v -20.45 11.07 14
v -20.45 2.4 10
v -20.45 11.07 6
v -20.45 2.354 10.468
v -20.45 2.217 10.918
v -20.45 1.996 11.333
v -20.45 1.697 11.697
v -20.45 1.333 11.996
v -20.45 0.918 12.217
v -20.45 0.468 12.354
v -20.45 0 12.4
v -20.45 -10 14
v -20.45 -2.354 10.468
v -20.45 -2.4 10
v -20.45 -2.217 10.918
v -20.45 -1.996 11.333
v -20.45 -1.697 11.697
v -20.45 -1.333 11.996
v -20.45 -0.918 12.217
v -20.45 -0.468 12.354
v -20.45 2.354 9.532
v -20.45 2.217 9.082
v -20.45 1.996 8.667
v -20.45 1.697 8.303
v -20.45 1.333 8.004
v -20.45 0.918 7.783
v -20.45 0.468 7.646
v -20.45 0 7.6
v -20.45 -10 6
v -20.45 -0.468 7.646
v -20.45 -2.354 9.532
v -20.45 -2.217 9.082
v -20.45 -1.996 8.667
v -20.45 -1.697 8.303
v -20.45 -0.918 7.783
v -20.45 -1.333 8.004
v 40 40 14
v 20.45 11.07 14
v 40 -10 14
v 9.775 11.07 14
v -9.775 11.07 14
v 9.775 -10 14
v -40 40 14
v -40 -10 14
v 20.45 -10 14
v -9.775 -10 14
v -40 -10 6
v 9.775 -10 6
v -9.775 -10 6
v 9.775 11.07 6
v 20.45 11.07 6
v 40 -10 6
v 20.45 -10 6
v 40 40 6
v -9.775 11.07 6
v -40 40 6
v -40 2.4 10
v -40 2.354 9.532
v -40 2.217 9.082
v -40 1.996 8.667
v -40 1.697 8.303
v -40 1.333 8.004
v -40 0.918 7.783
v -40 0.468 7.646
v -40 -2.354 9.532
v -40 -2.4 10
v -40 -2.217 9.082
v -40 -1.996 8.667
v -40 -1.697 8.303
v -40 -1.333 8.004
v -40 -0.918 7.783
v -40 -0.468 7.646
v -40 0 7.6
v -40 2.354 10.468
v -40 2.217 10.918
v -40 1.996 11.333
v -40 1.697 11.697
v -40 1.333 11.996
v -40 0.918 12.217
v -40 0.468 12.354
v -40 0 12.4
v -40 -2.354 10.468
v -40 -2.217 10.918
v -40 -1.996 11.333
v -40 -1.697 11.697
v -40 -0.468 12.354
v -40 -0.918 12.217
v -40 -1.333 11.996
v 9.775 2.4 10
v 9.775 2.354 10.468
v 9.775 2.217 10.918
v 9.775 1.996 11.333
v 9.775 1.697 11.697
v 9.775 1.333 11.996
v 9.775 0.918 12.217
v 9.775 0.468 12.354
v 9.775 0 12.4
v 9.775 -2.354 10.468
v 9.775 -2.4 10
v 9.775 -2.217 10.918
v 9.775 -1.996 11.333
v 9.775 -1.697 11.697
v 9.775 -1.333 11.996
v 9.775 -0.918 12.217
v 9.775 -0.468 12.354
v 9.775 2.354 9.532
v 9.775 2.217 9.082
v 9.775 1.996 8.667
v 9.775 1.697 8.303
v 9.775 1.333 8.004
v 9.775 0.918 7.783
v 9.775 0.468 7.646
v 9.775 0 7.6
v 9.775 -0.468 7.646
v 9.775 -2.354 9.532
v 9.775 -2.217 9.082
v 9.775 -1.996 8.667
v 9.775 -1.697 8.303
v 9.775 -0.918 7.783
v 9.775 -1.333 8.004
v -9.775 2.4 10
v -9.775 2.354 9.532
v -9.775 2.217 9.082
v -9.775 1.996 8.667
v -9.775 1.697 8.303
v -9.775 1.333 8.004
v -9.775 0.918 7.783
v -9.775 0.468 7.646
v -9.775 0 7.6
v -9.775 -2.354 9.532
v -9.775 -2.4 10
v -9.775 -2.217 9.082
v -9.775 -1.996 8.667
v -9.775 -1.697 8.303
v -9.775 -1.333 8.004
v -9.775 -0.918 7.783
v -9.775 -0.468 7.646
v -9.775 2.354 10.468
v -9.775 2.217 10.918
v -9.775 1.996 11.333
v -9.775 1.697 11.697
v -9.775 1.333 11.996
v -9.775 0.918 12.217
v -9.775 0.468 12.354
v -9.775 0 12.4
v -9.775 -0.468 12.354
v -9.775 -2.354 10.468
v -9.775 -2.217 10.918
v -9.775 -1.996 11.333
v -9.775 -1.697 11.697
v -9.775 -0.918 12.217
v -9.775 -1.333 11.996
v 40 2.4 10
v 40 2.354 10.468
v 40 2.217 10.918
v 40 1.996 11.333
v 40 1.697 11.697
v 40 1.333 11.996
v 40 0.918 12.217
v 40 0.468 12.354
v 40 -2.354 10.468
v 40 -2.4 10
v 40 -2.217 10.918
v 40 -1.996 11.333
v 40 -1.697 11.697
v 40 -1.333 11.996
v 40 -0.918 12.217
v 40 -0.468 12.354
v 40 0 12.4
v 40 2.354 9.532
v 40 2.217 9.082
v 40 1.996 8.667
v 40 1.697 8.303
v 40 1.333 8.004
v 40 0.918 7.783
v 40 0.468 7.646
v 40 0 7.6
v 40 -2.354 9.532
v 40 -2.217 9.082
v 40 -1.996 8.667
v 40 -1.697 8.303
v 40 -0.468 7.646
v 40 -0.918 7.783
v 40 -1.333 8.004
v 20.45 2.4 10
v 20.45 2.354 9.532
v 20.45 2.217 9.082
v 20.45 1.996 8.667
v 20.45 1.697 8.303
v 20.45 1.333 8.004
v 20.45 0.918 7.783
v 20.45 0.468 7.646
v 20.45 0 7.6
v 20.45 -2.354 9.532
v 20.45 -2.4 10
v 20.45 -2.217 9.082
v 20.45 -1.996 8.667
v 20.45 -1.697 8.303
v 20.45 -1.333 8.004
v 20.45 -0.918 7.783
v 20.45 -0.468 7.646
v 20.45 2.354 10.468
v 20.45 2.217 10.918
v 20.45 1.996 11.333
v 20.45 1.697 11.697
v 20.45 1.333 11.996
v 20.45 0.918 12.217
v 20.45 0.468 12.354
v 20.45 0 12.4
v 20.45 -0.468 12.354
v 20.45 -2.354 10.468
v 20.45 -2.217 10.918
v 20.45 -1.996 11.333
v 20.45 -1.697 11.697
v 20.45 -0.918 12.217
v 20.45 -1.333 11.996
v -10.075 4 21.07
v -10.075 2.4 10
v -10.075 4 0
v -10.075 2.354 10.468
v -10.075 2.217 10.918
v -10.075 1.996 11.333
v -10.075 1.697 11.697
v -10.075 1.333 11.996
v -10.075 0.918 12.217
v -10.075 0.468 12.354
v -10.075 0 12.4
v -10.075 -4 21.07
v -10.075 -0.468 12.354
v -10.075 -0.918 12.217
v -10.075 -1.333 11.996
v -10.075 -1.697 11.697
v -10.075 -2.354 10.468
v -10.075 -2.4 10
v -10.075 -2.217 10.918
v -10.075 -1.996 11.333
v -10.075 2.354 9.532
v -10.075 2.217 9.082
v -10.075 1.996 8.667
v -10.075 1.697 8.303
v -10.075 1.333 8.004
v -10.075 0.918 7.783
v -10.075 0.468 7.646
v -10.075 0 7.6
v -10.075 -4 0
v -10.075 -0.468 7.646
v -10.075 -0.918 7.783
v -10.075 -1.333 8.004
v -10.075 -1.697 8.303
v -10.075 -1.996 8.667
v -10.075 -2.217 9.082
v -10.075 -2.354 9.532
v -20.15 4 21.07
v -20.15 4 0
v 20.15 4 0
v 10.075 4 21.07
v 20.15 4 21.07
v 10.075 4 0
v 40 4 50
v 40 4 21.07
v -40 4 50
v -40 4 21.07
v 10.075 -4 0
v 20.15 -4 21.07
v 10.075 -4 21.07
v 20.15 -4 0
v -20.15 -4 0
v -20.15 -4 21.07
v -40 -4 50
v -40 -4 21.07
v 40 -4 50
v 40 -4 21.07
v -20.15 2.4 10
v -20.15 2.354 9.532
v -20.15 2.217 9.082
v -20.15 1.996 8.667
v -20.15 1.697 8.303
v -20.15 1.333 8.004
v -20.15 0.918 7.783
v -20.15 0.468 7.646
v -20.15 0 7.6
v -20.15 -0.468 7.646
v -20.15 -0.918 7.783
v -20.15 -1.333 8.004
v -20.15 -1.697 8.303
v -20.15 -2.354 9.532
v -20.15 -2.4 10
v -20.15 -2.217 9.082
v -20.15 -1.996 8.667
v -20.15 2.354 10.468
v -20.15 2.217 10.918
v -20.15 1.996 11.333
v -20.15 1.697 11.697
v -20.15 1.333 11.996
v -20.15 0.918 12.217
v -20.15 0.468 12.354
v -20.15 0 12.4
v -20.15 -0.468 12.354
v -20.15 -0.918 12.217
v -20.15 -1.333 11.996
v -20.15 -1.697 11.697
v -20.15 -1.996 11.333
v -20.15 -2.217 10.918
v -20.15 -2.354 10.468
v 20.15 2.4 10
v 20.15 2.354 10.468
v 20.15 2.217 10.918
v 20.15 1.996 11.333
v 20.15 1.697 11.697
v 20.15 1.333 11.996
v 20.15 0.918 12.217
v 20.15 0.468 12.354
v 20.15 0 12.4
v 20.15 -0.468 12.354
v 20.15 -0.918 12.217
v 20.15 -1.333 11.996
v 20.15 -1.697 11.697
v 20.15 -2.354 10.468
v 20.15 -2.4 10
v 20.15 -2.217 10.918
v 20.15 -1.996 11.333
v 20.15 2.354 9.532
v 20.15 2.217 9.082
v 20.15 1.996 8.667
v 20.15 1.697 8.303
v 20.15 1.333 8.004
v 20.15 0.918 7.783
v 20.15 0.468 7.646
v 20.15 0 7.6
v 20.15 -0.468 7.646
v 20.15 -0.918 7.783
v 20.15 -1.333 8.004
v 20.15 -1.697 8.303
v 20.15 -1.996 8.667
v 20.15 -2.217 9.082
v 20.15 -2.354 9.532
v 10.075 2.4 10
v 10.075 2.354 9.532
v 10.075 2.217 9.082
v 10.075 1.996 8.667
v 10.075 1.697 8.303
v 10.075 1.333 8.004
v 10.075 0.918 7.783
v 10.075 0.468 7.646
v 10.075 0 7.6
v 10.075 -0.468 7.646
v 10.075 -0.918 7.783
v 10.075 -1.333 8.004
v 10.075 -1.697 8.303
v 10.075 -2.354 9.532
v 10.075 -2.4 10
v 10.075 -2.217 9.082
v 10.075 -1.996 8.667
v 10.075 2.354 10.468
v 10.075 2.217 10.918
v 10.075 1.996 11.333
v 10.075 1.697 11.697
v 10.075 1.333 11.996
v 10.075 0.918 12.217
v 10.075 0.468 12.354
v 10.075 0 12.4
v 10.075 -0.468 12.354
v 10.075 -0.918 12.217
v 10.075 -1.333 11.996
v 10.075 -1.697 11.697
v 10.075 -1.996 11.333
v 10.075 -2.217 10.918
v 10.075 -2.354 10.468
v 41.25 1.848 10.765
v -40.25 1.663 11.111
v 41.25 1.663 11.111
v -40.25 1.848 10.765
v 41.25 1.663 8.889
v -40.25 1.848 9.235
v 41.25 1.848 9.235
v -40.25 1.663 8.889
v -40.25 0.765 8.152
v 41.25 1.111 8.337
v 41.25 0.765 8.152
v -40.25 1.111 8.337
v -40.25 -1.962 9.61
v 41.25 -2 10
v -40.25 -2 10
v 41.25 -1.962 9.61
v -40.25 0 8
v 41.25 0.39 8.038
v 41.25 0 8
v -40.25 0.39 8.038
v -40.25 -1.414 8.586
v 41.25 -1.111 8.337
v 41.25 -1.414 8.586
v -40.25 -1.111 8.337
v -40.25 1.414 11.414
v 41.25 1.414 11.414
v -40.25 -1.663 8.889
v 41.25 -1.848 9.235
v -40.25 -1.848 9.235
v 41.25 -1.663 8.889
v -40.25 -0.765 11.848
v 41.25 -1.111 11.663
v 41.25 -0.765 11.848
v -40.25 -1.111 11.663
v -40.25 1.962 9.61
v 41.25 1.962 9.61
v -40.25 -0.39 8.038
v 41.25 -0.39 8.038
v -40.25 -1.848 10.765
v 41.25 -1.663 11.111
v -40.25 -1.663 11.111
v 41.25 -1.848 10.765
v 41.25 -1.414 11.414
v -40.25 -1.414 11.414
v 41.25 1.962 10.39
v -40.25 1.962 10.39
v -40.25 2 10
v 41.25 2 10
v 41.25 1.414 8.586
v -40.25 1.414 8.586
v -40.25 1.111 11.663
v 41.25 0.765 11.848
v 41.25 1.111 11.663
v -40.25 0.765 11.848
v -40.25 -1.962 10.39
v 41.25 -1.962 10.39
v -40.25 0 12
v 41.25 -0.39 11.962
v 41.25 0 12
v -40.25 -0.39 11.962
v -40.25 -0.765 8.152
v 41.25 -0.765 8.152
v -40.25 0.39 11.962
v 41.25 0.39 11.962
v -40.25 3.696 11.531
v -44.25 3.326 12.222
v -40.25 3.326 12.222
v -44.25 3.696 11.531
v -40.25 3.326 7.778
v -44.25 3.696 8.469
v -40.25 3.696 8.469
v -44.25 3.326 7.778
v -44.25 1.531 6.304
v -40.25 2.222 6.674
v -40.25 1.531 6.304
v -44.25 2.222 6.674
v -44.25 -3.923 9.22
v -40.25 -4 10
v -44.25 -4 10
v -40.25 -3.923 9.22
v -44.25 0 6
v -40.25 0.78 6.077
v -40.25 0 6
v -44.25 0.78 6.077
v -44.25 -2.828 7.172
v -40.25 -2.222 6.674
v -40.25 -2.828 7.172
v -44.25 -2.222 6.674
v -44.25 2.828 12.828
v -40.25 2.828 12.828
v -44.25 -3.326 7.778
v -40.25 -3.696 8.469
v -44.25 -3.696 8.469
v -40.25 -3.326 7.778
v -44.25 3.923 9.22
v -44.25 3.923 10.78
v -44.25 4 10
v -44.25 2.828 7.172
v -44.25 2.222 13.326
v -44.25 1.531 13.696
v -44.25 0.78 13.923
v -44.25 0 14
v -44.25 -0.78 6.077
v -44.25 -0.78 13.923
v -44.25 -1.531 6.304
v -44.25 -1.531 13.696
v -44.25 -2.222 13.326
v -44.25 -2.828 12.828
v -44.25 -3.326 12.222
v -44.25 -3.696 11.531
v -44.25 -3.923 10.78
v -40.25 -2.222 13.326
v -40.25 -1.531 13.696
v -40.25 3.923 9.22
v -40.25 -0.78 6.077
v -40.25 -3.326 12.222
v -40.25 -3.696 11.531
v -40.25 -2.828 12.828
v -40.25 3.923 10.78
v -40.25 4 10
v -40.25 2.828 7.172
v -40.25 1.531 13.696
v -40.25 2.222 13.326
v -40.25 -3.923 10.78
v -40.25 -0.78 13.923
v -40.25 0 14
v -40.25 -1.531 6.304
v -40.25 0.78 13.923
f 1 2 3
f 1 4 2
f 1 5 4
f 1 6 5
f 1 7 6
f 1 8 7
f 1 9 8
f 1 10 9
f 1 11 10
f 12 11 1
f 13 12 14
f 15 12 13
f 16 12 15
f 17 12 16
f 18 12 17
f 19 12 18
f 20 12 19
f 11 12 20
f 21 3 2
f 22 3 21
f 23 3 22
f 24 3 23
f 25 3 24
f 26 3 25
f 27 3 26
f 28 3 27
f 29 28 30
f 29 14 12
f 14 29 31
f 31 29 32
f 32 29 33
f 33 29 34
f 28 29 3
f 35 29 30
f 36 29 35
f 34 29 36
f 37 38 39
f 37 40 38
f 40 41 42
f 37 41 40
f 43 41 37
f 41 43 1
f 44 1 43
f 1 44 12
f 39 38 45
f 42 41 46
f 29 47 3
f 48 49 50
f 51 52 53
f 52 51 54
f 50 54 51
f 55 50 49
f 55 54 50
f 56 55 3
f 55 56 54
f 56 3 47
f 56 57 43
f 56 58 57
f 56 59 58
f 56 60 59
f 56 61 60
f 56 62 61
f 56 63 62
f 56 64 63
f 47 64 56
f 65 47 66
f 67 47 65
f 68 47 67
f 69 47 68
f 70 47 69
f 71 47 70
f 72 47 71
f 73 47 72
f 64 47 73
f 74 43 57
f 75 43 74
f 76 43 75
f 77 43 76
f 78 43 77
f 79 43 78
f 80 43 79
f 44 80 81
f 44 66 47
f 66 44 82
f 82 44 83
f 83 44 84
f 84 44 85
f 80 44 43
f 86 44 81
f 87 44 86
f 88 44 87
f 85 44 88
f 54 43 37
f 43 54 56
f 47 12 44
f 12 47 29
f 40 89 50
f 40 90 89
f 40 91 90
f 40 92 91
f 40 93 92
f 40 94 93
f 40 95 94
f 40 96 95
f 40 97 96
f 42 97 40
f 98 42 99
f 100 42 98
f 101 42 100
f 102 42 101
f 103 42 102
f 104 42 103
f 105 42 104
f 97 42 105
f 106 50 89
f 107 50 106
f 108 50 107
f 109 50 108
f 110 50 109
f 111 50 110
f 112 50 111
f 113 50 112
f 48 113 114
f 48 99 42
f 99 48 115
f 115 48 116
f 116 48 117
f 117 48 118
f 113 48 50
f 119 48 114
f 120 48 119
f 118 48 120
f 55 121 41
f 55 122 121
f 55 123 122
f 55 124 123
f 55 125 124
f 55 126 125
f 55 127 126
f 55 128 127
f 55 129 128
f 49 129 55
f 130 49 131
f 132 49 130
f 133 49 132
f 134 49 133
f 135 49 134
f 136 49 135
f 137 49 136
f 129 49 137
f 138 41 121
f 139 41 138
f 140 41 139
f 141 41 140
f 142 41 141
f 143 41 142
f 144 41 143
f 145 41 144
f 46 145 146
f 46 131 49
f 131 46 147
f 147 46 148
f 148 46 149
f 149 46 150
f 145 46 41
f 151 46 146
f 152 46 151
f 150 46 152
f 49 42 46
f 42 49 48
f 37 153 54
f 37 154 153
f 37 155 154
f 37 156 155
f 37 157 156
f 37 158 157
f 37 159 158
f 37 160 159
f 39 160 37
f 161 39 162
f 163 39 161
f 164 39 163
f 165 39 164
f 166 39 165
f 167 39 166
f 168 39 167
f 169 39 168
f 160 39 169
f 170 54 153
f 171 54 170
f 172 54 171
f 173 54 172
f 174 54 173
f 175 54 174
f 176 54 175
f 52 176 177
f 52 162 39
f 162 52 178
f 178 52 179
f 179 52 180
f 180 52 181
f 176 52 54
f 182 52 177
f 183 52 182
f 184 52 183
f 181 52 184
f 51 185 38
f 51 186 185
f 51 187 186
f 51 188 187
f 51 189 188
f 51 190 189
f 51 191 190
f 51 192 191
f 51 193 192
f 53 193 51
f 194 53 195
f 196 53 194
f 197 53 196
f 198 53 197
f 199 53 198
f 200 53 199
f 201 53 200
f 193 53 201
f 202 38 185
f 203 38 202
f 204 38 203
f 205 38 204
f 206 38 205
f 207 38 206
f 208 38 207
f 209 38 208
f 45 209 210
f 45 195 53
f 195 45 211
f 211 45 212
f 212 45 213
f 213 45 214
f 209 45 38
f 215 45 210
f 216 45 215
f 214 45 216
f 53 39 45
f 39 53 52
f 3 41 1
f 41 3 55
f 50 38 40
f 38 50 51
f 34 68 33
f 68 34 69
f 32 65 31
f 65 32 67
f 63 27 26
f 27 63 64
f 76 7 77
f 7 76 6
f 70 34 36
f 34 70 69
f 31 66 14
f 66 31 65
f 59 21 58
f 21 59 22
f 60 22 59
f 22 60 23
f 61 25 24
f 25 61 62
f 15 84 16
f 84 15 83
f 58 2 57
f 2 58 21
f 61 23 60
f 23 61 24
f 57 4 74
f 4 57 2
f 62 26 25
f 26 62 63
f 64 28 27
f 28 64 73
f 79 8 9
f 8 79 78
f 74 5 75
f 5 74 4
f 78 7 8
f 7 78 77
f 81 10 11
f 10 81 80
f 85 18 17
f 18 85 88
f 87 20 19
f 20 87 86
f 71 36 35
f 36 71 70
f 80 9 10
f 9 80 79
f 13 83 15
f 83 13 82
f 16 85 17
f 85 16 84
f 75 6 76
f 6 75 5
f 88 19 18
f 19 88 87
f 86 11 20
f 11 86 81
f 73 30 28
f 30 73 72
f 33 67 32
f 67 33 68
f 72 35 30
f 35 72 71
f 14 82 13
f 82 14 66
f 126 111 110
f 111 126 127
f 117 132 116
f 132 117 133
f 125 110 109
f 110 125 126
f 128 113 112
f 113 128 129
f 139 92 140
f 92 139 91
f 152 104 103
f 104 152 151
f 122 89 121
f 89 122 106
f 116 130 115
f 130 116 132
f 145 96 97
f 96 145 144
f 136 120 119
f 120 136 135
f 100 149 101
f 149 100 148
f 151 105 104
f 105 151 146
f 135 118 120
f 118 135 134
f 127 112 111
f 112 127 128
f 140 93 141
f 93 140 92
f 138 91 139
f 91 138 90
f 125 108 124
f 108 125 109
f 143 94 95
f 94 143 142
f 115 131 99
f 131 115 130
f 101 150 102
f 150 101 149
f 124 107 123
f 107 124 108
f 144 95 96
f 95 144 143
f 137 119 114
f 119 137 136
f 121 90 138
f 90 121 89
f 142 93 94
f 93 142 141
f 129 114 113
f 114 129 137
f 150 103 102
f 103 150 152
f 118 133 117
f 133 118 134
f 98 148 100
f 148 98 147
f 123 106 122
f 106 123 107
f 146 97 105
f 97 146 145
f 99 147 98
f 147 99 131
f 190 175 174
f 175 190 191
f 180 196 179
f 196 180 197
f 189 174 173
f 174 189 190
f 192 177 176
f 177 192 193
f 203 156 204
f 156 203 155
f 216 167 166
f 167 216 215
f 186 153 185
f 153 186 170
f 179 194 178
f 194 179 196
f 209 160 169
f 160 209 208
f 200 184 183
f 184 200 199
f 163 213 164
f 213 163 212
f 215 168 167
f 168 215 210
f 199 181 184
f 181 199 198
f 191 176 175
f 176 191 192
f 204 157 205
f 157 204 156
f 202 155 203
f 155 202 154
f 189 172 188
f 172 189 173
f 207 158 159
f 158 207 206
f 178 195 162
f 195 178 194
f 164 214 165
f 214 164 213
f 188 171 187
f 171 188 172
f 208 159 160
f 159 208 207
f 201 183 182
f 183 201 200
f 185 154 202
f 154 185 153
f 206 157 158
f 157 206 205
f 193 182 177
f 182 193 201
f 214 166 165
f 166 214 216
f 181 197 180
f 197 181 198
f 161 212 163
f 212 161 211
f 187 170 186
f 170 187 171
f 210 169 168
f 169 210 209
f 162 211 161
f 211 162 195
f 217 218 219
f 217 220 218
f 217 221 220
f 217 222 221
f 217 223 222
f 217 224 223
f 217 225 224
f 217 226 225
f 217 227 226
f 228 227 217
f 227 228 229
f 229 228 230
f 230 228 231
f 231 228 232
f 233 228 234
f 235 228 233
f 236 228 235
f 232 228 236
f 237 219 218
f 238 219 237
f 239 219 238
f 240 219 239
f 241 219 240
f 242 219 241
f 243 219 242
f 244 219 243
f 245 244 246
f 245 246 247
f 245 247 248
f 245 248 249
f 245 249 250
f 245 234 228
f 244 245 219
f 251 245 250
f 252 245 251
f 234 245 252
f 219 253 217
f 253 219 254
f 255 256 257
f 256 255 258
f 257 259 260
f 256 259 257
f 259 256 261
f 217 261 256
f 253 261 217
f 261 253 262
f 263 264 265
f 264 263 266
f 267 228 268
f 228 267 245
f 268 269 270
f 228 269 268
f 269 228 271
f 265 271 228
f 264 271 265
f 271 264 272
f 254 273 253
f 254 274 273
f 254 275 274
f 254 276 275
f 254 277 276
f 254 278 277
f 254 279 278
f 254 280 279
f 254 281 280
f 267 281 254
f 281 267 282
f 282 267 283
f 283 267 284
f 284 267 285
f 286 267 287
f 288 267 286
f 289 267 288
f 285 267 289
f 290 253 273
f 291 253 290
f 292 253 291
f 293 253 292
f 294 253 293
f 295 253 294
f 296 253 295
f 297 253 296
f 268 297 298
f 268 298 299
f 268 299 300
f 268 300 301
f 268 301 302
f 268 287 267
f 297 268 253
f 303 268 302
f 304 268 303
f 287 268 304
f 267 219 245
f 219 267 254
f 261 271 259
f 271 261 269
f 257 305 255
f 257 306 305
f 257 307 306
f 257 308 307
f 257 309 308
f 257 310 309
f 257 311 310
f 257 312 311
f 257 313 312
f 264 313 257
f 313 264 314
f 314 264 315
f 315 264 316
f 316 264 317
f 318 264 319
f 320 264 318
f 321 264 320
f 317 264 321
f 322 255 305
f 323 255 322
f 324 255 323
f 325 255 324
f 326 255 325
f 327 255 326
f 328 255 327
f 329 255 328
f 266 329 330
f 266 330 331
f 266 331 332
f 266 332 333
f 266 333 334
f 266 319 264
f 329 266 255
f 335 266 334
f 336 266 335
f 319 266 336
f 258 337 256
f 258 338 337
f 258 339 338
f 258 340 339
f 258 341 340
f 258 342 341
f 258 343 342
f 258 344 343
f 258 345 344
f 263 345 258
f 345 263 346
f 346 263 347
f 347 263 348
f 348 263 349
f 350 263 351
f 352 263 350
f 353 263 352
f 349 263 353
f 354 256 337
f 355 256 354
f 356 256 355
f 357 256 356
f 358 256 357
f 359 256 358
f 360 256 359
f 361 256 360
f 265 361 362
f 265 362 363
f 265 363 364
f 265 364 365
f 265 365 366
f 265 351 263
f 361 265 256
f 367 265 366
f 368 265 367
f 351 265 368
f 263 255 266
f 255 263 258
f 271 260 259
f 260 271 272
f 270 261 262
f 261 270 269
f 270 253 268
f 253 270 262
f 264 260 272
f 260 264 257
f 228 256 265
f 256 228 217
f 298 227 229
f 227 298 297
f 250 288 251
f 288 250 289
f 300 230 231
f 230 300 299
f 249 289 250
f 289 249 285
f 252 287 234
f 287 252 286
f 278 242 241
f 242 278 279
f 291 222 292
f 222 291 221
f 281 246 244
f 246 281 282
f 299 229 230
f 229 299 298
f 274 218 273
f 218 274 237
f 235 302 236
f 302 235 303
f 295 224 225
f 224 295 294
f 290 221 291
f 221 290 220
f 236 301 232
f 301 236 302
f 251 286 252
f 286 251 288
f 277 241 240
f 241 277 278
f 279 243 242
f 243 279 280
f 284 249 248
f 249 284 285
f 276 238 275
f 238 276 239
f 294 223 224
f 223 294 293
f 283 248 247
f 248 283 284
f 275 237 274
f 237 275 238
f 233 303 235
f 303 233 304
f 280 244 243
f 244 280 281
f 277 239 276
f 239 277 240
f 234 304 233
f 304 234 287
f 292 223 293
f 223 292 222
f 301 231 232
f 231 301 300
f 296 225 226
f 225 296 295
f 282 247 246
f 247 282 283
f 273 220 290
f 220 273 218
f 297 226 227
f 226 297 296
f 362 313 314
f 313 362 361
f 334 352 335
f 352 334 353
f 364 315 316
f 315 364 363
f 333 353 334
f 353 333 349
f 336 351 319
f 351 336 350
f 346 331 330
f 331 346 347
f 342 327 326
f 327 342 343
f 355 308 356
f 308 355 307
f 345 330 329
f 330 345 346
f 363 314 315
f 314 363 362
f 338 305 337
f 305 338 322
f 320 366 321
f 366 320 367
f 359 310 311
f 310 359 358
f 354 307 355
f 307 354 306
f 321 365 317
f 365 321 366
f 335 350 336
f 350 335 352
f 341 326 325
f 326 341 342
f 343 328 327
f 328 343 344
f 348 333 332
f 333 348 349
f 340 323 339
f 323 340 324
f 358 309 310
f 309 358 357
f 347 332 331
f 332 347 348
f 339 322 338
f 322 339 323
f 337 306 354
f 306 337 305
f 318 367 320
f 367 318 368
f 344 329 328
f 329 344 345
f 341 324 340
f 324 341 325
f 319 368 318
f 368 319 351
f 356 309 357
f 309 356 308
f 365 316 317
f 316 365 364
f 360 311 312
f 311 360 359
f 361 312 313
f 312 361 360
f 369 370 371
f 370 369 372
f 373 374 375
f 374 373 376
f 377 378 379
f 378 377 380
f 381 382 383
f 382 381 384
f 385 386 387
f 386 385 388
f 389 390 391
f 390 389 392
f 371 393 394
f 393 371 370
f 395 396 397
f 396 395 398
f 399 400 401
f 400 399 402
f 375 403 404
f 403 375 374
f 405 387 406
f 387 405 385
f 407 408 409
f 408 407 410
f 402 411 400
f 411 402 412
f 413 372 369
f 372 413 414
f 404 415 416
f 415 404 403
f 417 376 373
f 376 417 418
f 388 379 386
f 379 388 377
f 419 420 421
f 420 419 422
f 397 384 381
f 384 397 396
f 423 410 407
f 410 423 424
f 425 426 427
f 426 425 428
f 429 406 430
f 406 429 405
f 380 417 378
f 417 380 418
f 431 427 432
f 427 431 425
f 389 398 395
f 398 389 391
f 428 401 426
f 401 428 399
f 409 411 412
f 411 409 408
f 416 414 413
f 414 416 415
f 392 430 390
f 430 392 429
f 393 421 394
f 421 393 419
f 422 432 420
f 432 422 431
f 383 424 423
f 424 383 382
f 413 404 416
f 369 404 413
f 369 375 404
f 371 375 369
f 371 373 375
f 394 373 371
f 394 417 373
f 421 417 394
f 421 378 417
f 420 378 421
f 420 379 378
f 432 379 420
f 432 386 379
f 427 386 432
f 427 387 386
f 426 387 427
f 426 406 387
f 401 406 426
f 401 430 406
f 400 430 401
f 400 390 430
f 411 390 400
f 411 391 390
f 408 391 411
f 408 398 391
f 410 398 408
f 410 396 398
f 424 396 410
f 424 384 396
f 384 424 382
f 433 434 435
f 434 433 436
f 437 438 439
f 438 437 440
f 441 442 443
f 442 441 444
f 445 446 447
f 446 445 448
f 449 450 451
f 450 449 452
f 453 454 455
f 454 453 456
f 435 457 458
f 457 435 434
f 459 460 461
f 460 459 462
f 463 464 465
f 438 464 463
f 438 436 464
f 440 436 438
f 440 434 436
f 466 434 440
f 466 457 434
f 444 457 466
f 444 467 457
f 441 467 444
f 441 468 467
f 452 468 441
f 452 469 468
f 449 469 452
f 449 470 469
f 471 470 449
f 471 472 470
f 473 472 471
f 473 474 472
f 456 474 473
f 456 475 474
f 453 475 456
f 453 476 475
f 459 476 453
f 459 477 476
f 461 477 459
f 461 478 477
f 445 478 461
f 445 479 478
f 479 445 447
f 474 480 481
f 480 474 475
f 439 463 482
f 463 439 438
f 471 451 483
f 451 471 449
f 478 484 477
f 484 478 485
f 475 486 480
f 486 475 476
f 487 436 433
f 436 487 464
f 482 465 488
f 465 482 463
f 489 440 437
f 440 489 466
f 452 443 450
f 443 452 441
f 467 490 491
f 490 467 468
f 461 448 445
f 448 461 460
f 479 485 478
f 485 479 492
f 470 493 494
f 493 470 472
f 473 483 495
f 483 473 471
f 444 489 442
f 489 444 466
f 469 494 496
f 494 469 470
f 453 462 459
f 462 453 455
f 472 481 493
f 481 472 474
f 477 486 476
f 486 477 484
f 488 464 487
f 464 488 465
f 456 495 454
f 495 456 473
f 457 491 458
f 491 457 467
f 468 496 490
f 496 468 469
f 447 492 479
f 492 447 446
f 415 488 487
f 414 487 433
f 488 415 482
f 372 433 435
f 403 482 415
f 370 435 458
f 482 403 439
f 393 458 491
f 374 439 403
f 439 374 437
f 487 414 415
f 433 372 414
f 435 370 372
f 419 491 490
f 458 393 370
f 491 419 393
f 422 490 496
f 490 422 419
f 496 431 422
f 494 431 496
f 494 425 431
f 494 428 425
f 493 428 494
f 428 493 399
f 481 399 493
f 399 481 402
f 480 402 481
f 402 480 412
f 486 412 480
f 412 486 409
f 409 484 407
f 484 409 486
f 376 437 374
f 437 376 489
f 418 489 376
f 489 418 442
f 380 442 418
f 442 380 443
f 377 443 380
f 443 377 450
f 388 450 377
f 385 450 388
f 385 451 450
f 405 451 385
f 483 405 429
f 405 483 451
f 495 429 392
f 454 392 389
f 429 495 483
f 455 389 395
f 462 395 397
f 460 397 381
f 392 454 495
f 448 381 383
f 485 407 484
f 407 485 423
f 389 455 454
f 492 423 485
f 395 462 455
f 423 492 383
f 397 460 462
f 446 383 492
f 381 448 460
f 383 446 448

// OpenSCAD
$fn = 32;

// ------------------------------------------------------------------------
// Butt hinge: hinge 80 mm, leaf swung 270 deg
// Every part is its own module, assembly() places every instance.
// ------------------------------------------------------------------------

// --- part 1 ---
module hinge_base() {
  difference() {
    union() {
      translate([-40, -10, -4]) cube([19.55, 50, 8]);
      translate([-9.775, -10, -4]) cube([19.55, 50, 8]);
      translate([20.45, -10, -4]) cube([19.55, 50, 8]);
      translate([-40, 11.07, -4]) cube([80, 28.93, 8]);
    }
    translate([-30.225, 0, 0]) rotate([0, 90, 0]) cylinder(h = 21.55, d = 4.8, center = true);
    translate([0, 0, 0]) rotate([0, 90, 0]) cylinder(h = 21.55, d = 4.8, center = true);
    translate([30.225, 0, 0]) rotate([0, 90, 0]) cylinder(h = 21.55, d = 4.8, center = true);
  }
}

// --- part 2 ---
module hinge_mover() {
  difference() {
    union() {
      translate([-20.15, -40, -4]) cube([10.075, 50, 8]);
      translate([10.075, -40, -4]) cube([10.075, 50, 8]);
      translate([-40, -40, -4]) cube([80, 28.93, 8]);
    }
    translate([-15.113, 0, 0]) rotate([0, 90, 0]) cylinder(h = 12.075, d = 4.8, center = true);
    translate([15.113, 0, 0]) rotate([0, 90, 0]) cylinder(h = 12.075, d = 4.8, center = true);
  }
}

// --- part 3 ---
module hinge_pin() {
  rotate([0, 90, 0]) cylinder(h = 82.5, d = 4, center = true);
  translate([-44.25, 0, 0]) rotate([0, 90, 0]) cylinder(h = 4, d = 8);
}

// --- assembly ---
module assembly() {
  color([0.80, 0.24, 0.20]) translate([0, 0, 10]) rotate([0, 0, 0]) hinge_base();
  color([0.20, 0.45, 0.75]) translate([0, 0, 10]) rotate([270, 0, 0]) hinge_mover();
  color([0.25, 0.62, 0.32]) translate([0, 0, 10]) rotate([0, 0, 0]) hinge_pin();
}

assembly();
